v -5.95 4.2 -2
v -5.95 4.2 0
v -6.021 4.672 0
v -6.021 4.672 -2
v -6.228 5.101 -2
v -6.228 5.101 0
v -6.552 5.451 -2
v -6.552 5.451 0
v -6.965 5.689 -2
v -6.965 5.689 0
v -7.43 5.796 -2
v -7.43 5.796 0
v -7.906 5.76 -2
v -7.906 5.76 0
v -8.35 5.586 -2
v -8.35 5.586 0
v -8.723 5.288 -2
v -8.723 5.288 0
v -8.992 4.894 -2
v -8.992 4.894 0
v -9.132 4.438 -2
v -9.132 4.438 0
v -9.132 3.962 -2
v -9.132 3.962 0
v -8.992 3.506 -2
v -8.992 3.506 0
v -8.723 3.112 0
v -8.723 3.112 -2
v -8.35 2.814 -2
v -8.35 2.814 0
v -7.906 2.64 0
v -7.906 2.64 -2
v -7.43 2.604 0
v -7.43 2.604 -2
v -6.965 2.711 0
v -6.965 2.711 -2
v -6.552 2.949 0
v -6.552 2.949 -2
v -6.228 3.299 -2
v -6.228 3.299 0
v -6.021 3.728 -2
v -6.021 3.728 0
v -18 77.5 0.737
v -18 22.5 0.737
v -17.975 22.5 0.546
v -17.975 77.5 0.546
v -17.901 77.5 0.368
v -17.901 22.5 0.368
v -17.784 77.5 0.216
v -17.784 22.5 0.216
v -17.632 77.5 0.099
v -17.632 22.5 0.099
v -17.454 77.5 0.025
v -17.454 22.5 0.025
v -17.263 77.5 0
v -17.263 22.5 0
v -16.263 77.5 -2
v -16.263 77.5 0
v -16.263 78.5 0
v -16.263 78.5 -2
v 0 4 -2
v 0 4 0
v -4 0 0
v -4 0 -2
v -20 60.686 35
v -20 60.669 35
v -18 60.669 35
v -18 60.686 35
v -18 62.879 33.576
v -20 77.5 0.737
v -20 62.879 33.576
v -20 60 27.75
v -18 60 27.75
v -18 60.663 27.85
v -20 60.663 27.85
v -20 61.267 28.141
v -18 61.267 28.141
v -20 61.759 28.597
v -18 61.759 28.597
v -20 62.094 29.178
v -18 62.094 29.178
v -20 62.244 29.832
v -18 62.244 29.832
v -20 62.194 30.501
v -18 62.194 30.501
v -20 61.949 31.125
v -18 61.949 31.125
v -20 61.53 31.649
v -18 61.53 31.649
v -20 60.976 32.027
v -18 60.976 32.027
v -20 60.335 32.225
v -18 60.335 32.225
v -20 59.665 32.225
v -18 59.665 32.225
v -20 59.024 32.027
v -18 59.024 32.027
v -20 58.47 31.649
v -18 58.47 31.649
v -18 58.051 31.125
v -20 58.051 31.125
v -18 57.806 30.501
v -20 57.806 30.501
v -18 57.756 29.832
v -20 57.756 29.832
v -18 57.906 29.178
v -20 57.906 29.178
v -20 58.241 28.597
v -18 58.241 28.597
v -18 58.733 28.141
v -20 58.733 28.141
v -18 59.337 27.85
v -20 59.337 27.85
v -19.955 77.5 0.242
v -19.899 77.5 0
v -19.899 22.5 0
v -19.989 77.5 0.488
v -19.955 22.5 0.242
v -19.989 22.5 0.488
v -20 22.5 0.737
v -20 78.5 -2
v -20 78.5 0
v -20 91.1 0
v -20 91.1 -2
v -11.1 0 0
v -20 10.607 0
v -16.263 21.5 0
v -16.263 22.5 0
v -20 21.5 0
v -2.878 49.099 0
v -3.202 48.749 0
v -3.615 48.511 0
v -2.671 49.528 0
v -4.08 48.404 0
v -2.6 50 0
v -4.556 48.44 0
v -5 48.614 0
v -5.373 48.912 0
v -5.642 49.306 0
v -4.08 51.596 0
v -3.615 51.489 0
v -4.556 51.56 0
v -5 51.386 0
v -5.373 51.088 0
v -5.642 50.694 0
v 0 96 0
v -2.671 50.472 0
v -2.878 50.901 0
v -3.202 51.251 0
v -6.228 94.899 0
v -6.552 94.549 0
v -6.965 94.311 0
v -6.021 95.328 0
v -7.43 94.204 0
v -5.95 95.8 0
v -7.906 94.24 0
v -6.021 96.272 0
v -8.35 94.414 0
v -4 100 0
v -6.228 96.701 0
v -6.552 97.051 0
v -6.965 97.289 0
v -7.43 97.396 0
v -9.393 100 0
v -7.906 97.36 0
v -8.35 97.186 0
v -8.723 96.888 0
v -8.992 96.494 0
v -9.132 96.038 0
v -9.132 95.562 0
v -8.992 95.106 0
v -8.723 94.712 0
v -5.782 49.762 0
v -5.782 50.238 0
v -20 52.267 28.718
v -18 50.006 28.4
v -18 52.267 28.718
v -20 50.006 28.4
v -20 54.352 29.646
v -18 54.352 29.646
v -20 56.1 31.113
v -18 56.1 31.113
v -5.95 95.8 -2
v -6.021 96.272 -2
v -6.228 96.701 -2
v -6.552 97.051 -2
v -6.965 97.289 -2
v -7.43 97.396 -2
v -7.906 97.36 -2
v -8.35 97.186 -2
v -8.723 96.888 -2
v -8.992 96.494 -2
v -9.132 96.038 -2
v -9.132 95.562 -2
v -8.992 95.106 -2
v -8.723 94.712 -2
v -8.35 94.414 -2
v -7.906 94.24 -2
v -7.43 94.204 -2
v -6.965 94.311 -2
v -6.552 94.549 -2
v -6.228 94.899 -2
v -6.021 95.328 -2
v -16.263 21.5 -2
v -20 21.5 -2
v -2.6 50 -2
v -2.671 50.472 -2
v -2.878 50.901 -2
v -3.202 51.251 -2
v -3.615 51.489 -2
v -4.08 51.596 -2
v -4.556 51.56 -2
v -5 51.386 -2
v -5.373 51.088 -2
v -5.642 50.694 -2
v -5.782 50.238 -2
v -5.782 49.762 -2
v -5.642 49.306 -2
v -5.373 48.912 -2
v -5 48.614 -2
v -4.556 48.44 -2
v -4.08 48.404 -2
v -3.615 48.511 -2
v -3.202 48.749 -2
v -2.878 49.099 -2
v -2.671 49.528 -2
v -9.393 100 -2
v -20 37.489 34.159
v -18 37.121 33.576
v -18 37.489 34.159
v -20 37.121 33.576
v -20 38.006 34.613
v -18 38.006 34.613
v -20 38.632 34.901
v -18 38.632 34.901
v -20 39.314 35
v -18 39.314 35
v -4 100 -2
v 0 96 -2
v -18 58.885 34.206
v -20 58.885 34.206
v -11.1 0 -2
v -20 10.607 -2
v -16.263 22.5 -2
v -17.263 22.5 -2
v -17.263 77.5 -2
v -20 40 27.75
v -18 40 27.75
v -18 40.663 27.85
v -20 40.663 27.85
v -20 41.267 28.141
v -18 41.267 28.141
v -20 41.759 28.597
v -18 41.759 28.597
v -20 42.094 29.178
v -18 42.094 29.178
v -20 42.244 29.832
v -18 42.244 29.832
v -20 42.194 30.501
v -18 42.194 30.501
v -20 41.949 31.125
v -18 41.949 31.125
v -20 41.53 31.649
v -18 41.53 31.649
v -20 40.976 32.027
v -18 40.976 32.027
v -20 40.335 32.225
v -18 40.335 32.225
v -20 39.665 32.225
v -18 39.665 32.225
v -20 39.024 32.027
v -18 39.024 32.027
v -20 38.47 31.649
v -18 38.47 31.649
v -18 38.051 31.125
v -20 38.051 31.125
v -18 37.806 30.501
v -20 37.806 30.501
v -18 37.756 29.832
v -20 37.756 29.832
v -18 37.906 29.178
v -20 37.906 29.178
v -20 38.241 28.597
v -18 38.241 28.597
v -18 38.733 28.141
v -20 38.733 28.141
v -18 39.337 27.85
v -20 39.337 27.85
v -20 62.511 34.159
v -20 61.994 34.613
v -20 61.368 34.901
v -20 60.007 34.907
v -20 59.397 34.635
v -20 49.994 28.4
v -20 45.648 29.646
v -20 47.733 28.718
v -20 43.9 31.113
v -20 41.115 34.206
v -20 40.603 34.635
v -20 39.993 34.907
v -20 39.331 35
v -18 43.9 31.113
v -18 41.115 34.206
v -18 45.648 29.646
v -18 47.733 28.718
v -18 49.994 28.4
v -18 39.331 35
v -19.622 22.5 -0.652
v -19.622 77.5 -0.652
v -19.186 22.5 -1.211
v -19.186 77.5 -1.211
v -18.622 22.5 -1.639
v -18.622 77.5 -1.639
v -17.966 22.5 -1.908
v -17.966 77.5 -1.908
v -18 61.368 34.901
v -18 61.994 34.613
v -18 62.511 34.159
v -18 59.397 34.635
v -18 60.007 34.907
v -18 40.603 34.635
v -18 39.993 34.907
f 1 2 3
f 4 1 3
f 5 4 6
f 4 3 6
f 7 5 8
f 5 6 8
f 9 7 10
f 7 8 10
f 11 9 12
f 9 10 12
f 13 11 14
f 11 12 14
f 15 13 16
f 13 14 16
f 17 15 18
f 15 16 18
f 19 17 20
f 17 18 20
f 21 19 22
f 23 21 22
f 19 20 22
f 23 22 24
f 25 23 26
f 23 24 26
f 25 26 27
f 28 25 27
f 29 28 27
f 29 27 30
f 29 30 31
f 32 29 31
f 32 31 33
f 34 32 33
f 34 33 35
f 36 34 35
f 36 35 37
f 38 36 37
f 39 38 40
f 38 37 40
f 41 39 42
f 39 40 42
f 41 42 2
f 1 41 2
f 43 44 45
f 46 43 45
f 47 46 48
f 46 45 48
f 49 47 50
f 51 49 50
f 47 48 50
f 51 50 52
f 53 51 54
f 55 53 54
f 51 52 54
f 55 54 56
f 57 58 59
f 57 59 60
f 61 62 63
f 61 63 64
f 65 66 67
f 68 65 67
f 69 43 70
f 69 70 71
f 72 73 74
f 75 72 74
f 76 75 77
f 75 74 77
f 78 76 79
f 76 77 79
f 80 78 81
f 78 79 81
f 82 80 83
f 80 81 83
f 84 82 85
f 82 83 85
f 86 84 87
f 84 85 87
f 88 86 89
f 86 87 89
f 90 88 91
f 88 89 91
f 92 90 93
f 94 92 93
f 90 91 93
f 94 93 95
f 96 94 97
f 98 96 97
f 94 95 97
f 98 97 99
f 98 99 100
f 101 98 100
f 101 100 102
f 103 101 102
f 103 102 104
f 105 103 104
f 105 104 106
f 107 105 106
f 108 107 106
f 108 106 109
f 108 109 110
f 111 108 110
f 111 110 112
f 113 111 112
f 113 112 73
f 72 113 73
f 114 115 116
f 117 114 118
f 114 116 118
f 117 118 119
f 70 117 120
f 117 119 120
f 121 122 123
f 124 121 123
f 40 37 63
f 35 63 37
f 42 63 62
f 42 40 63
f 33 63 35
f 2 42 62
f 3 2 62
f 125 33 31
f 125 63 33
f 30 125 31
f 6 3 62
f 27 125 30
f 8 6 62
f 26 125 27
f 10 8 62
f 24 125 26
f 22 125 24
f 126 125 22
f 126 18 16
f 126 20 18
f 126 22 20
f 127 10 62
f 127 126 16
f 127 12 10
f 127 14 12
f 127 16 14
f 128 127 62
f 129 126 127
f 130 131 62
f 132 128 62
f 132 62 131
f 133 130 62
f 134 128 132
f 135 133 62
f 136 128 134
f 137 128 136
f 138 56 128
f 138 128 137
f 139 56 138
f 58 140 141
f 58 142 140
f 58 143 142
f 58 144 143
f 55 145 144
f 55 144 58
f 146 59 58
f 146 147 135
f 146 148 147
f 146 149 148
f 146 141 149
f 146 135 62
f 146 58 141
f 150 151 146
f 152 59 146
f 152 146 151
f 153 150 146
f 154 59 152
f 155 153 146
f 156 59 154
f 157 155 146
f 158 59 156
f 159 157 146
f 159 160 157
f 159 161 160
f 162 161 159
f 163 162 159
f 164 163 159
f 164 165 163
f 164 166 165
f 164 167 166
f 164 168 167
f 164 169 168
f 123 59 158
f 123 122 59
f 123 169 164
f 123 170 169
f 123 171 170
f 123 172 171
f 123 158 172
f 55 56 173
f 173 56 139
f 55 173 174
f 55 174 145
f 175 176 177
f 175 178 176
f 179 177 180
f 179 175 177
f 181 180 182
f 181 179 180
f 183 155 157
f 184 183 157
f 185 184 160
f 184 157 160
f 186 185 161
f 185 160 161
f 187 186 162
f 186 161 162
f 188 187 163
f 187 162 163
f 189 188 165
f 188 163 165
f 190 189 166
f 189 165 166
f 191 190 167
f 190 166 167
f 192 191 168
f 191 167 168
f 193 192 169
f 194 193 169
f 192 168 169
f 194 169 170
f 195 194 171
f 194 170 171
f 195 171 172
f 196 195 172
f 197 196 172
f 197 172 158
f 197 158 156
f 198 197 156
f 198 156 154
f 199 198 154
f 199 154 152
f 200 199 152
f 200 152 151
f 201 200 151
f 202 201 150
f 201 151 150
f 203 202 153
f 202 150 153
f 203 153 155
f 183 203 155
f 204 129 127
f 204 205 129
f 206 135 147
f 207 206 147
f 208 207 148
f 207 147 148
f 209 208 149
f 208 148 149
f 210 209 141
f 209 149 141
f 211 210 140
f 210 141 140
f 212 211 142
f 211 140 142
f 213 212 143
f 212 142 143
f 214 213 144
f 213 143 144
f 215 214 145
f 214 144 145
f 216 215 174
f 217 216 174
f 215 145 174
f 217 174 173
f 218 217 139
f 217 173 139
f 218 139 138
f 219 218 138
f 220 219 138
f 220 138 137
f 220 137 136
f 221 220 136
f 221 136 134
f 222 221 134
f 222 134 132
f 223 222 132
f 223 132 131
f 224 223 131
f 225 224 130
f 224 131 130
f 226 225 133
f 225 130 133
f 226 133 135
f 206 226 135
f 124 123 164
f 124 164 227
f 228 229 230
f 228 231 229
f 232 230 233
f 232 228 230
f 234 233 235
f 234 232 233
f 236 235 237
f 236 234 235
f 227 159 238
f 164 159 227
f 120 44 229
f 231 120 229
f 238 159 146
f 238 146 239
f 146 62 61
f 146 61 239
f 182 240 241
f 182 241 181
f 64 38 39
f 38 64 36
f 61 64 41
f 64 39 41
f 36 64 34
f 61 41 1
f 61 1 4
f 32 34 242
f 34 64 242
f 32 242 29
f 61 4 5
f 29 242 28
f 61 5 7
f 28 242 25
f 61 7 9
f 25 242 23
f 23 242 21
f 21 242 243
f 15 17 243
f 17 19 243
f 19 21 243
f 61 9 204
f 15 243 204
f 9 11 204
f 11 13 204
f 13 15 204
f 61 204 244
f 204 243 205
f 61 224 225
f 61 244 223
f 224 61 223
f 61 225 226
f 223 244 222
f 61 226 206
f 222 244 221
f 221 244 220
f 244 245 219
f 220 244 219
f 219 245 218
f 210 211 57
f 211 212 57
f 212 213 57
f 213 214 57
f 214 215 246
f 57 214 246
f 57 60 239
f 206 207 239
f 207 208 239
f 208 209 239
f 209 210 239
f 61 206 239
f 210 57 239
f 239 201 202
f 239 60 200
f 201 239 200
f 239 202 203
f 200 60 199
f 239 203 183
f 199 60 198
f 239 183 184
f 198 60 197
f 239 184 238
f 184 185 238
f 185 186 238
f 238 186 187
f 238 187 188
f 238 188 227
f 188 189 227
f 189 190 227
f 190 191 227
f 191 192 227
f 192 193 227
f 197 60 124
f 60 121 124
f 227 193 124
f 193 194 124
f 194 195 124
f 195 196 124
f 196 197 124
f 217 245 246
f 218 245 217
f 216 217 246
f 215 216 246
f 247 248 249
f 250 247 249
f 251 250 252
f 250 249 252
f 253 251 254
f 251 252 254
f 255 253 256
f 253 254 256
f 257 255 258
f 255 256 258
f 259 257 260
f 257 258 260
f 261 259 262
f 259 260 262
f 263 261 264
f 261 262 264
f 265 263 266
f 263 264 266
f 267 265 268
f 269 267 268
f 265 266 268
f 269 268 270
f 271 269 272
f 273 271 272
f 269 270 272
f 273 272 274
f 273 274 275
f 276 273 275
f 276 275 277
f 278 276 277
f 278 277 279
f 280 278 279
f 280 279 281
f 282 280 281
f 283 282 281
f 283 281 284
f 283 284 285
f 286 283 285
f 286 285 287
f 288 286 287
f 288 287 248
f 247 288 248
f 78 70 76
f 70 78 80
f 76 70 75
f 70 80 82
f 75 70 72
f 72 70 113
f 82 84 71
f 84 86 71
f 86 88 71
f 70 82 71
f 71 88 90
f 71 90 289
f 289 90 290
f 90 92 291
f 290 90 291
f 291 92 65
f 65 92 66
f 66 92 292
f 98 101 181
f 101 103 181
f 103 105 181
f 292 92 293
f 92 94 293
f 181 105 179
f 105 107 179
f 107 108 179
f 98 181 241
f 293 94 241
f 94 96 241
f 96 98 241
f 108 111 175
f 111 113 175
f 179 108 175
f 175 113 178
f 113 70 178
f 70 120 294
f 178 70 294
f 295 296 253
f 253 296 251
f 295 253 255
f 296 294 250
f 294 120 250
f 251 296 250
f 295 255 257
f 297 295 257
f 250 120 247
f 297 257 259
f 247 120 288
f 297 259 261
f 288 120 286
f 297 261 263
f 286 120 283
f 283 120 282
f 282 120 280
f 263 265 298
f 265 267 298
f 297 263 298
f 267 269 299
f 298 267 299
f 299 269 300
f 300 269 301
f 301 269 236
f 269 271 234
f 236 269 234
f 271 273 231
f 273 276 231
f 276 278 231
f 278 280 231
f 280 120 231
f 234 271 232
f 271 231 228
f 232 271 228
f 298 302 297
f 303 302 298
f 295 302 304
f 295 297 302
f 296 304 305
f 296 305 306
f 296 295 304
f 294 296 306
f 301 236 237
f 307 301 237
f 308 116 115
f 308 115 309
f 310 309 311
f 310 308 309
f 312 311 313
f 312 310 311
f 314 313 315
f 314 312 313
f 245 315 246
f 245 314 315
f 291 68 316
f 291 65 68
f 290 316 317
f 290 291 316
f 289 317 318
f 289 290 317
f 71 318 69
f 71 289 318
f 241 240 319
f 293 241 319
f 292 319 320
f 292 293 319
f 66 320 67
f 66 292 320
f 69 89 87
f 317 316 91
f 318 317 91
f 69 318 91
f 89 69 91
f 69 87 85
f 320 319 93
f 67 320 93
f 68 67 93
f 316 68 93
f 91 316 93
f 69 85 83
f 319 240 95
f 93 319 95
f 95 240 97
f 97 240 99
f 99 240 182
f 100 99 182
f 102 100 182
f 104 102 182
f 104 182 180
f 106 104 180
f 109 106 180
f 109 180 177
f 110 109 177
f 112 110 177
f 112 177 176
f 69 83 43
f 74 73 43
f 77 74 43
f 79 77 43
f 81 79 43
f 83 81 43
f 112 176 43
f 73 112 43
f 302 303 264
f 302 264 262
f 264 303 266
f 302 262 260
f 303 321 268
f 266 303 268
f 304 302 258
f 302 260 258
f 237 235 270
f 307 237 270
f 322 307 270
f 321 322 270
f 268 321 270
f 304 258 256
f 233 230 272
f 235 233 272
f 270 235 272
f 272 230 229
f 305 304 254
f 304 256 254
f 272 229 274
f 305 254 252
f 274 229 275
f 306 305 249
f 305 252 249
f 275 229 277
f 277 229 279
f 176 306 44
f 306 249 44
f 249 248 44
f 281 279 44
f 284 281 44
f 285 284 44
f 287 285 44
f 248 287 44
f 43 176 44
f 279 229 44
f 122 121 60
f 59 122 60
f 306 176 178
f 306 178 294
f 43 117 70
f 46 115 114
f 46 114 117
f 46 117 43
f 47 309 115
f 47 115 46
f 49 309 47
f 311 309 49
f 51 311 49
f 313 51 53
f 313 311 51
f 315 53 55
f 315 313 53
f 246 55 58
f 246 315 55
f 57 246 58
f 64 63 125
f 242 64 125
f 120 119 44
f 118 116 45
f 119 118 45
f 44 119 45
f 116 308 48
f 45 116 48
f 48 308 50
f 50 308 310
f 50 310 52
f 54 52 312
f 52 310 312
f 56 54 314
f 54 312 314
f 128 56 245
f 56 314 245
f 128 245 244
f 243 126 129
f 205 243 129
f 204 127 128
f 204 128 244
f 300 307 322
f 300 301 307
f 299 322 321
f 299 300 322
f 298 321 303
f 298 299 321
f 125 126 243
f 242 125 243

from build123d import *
from OCP.BRepFilletAPI import BRepFilletAPI_MakeChamfer

# Parameters (mm, degrees)
SKETCH1_W             = 100
SKETCH1_H             = 20
SKETCH1_R             = 1.6
BASE_FLANGE2_DEPTH    = 2
MITER_START           = 21.5
MITER_FLANGE1_DEPTH   = 57
MITER_FLANGE1_2_DEPTH = 1
MITER_START_2         = 77.5
MITER_FLANGE1_3_DEPTH = 1
MITER_START_3         = 22.5
MITER_FLANGE1_4_DEPTH = 55
CUT_EXTRUDE2_DEPTH    = 108.466273779
FILLET1_R             = 2.4
FILLET2_R             = 8.2
SKETCH8_R             = 2.25
CUT_EXTRUDE1_DEPTH    = 108.466273779
CHAMFER1_SIZE         = 8.9
CHAMFER1_SIZE2        = 10.606606974
CHAMFER2_SIZE         = 4


# Read off the part's stored shape, not the designer's step: Miter Flange1
# Sheet-metal steps are written as plain solids
with BuildPart() as part:
    # Sketch1 → Base-Flange2 (new body)
    with BuildSketch(Plane(origin=(0, 0, 0), x_dir=(0, 1, 0), z_dir=(0, 0, 1))):
        with Locations((50, 10)):
            Rectangle(SKETCH1_W, SKETCH1_H)
        with Locations(Location((50, 4.2, 0), (0, 0, 270))):
            Circle(SKETCH1_R, mode=Mode.SUBTRACT)
        with Locations(Location((4.2, 7.55, 0), (0, 0, 270))):
            Circle(SKETCH1_R, mode=Mode.SUBTRACT)
        with Locations(Location((95.8, 7.55, 0), (0, 0, 270))):
            Circle(SKETCH1_R, mode=Mode.SUBTRACT)
    extrude(amount=-BASE_FLANGE2_DEPTH)

    # Miter Flange1 outline → Miter Flange1 (cut)
    with BuildSketch(Plane(origin=(0, 0, 0), x_dir=(1, 0, 0), z_dir=(0, 1, 0)).offset(MITER_START)):
        with BuildLine():
            Line((-20, 0), (-19.899002398, 0))
            ThreePointArc((-19.899002398, 0), (-18.917667209, 1.443395312), (-17.2634, 2))
            Line((-17.2634, 2), (-20, 2))
            Line((-20, 2), (-20, 0))
        make_face()
    extrude(amount=MITER_FLANGE1_DEPTH, mode=Mode.SUBTRACT)

    # Miter Flange1 2 outline → Miter Flange1 2 (cut)
    with BuildSketch(Plane(origin=(0, 0, 0), x_dir=(1, 0, 0), z_dir=(0, 1, 0)).offset(MITER_START)):
        with BuildLine():
            ThreePointArc((-17.2634, 2), (-18.917667209, 1.443395312), (-19.899002398, 0))
            Line((-19.899002398, 0), (-16.2634, 0))
            Line((-16.2634, 0), (-16.2634, 2))
            Line((-16.2634, 2), (-17.2634, 2))
        make_face()
    extrude(amount=MITER_FLANGE1_2_DEPTH, mode=Mode.SUBTRACT)

    # Miter Flange1 3 outline → Miter Flange1 3 (cut)
    with BuildSketch(Plane(origin=(0, 0, 0), x_dir=(1, 0, 0), z_dir=(0, 1, 0)).offset(MITER_START_2)):
        with BuildLine():
            ThreePointArc((-17.2634, 2), (-18.917667209, 1.443395312), (-19.899002398, 0))
            Line((-19.899002398, 0), (-16.2634, 0))
            Line((-16.2634, 0), (-16.2634, 2))
            Line((-16.2634, 2), (-17.2634, 2))
        make_face()
    extrude(amount=MITER_FLANGE1_3_DEPTH, mode=Mode.SUBTRACT)

    # Miter Flange1 4 outline → Miter Flange1 4 (add)
    with BuildSketch(Plane(origin=(0, 0, 0), x_dir=(1, 0, 0), z_dir=(0, 1, 0)).offset(MITER_START_3)):
        with BuildLine():
            Line((-20, -0.7366), (-20, -35))
            Line((-20, -35), (-18, -35))
            Line((-18, -35), (-18, -0.7366))
            ThreePointArc((-18, -0.7366), (-17.784254855, -0.215745145), (-17.2634, 0))
            Line((-17.2634, 0), (-19.899002398, 0))
            ThreePointArc((-19.899002398, 0), (-19.974633029, -0.364854094), (-20, -0.7366))
        make_face()
    extrude(amount=MITER_FLANGE1_4_DEPTH)

    # Sketch9 → Cut-Extrude2 (cut, through all)
    with BuildSketch(Plane.YZ.offset(-18)):
        Polygon((22.5, 0.7366), (37.755048536, 35), (22.5, 35), align=None)
        Polygon((62.244951464, 35), (77.5, 35), (77.5, 0.7366), align=None)
        Polygon((40.4, 35), (59.6, 35), (53.657333308, 28.4), (46.342666692, 28.4), align=None)
    extrude(amount=-CUT_EXTRUDE2_DEPTH, mode=Mode.SUBTRACT)

    # Fillet1
    fillet1_edges = [part.edges().sort_by_distance(p)[0] for p in [
        (-19, 40.4, 35),
        (-19, 59.6, 35),
        (-19, 37.755048536, 35),
        (-19, 62.244951464, 35),
    ]]
    fillet(fillet1_edges, radius=FILLET1_R)

    # Fillet2
    fillet2_edges = [part.edges().sort_by_distance(p)[0] for p in [
        (-19, 53.657333308, 28.4),
        (-19, 46.342666692, 28.4),
    ]]
    fillet(fillet2_edges, radius=FILLET2_R)

    # Sketch8 → Cut-Extrude1 (cut, through all)
    with BuildSketch(Plane.YZ.offset(-18)):
        with Locations(Location((40, 30, 0), (0, 0, 270))):
            Circle(SKETCH8_R)
        with Locations(Location((60, 30, 0), (0, 0, 270))):
            Circle(SKETCH8_R)
    extrude(amount=-CUT_EXTRUDE1_DEPTH, mode=Mode.SUBTRACT)

    # Chamfer1: one chamfer whose edges measure the first distance from different faces: ONE call of the kernel's chamfer builder (chamfer() names one face for all edges)
    chamfer1_edges_1 = [part.edges().sort_by_distance(p)[0] for p in [
        (-20, 0, -1),
    ]]
    chamfer1_side_1 = [part.faces().sort_by_distance(p)[0] for p in [
        (-10, 0, -1),
    ]]
    chamfer1_edges_2 = [part.edges().sort_by_distance(p)[0] for p in [
        (-20, 100, -1),
    ]]
    chamfer1_side_2 = [part.faces().sort_by_distance(p)[0] for p in [
        (-20, 89.25, -1),
    ]]
    chamfer1 = BRepFilletAPI_MakeChamfer(part.part.solid().wrapped)
    for e in chamfer1_edges_1:
        chamfer1.Add(CHAMFER1_SIZE, CHAMFER1_SIZE2, e.wrapped, chamfer1_side_1[0].wrapped)  # the first distance lies on this face
    for e in chamfer1_edges_2:
        chamfer1.Add(CHAMFER1_SIZE, CHAMFER1_SIZE2, e.wrapped, chamfer1_side_2[0].wrapped)  # the first distance lies on this face
    add(Compound.cast(chamfer1.Shape()), mode=Mode.REPLACE)

    # Chamfer2
    chamfer2_edges = [part.edges().sort_by_distance(p)[0] for p in [
        (0, 100, -1),
        (0, 0, -1),
    ]]
    chamfer(chamfer2_edges, length=CHAMFER2_SIZE)


solid = part.part
